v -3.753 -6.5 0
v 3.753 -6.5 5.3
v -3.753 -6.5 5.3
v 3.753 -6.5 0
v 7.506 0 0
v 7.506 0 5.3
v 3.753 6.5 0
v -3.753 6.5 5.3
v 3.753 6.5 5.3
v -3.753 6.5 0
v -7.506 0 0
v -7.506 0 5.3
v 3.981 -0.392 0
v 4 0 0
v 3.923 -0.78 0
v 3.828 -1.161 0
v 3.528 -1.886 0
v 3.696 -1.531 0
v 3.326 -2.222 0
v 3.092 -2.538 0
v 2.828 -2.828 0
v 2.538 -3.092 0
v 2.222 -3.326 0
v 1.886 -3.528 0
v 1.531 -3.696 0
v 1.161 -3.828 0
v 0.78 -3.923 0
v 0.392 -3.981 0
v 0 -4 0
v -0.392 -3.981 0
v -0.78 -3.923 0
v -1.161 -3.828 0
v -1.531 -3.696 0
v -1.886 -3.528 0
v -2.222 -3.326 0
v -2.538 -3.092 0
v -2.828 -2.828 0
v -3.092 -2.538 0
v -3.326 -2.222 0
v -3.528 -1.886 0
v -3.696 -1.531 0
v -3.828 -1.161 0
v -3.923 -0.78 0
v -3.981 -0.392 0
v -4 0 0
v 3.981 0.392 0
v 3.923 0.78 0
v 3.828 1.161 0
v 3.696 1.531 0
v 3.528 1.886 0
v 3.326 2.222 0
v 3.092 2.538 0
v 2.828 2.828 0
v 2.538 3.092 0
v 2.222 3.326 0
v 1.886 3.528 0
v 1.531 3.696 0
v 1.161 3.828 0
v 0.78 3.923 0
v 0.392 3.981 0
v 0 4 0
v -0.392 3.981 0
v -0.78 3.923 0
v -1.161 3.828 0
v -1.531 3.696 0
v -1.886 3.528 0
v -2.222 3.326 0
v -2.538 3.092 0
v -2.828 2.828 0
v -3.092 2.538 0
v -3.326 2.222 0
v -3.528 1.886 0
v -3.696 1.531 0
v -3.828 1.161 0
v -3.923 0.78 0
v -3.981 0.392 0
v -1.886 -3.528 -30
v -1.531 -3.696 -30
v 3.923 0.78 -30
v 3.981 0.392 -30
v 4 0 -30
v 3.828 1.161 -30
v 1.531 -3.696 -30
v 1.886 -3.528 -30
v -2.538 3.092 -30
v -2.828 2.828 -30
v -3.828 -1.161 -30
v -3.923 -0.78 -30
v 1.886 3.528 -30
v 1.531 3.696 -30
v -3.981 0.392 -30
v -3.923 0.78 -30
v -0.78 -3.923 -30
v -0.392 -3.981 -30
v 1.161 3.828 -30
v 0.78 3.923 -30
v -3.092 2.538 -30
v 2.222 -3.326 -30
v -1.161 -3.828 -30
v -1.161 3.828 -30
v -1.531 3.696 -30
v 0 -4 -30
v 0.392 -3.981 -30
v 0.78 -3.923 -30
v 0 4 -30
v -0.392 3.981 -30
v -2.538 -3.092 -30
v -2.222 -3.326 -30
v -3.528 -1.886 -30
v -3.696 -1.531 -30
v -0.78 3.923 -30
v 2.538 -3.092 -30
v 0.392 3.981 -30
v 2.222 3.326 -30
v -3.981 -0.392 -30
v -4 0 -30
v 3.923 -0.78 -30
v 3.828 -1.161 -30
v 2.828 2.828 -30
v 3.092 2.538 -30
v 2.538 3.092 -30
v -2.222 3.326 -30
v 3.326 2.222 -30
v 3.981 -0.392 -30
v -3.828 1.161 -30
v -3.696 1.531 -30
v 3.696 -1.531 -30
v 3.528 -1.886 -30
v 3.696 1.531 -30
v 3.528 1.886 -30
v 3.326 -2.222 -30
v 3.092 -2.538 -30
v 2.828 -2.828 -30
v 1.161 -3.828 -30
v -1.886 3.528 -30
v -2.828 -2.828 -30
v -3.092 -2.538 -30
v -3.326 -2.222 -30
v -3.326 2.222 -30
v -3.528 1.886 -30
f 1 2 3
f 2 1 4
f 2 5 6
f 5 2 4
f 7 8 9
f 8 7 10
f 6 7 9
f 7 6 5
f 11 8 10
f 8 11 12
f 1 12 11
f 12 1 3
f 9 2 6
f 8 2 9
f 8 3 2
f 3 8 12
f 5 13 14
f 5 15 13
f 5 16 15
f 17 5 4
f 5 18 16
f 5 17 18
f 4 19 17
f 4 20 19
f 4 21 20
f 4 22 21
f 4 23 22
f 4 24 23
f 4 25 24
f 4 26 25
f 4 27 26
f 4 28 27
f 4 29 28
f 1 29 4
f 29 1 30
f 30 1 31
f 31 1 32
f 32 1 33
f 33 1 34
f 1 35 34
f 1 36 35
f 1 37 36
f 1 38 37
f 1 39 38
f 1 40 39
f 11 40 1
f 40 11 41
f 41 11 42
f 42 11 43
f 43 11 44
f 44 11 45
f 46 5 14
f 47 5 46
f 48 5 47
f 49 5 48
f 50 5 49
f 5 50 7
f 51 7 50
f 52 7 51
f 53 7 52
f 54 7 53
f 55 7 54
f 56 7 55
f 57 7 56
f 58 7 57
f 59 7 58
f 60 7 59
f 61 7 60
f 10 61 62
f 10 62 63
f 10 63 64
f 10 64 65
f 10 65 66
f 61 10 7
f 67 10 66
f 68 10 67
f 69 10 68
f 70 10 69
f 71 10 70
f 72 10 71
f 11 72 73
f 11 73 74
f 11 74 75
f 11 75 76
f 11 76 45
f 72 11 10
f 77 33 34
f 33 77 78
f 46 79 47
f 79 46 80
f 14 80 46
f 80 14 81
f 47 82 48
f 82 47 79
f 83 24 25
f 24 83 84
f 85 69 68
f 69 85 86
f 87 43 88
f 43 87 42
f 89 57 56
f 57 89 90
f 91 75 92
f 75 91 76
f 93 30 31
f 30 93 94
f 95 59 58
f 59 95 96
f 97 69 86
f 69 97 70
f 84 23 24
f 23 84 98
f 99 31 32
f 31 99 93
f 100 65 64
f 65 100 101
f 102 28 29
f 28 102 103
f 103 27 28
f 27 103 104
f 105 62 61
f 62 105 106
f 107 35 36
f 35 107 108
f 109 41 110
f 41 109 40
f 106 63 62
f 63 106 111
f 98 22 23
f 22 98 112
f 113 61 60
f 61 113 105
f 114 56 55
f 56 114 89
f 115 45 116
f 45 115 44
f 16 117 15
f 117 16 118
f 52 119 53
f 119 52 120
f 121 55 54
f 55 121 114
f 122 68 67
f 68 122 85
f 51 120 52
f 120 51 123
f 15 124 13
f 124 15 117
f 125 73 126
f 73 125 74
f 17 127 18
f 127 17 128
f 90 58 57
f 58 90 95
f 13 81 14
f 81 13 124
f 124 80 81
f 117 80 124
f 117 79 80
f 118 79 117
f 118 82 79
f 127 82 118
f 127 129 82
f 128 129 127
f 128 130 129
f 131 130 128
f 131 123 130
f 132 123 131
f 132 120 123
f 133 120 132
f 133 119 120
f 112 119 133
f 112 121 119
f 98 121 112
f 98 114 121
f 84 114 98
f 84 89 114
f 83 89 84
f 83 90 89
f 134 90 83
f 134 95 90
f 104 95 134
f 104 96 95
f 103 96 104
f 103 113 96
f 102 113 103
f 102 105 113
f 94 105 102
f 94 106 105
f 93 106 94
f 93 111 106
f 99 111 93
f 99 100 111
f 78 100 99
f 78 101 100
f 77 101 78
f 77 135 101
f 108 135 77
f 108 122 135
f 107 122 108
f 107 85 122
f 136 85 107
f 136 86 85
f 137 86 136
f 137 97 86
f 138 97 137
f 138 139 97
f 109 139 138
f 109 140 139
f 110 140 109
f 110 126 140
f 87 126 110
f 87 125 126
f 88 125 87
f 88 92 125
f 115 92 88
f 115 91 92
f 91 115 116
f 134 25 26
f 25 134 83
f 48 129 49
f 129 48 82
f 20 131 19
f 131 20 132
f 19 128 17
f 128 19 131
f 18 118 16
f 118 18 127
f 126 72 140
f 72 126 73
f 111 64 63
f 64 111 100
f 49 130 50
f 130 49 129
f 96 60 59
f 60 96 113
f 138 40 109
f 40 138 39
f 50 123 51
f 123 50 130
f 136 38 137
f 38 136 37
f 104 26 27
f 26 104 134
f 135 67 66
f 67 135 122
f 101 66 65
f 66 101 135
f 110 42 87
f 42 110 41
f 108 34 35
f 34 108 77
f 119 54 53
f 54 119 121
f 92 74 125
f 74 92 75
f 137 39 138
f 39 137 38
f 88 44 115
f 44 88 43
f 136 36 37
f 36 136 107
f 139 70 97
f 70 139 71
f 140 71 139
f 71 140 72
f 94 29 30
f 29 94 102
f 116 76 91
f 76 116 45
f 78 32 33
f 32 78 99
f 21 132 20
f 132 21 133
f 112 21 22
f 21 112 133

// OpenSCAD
// M8 Hex Bolt (thread simplified)
// Head: across-flats 13 mm, height 5.3 mm
// Shank: Ø8 mm, length 30 mm (extends toward –Z)

union() {
    // Hexagonal head
    cylinder(h = 5.3, r = 13 / sqrt(3), $fn = 6);

    // Cylindrical shank
    translate([0, 0, -30])
        cylinder(h = 30, r = 4, $fn = 64);
}
